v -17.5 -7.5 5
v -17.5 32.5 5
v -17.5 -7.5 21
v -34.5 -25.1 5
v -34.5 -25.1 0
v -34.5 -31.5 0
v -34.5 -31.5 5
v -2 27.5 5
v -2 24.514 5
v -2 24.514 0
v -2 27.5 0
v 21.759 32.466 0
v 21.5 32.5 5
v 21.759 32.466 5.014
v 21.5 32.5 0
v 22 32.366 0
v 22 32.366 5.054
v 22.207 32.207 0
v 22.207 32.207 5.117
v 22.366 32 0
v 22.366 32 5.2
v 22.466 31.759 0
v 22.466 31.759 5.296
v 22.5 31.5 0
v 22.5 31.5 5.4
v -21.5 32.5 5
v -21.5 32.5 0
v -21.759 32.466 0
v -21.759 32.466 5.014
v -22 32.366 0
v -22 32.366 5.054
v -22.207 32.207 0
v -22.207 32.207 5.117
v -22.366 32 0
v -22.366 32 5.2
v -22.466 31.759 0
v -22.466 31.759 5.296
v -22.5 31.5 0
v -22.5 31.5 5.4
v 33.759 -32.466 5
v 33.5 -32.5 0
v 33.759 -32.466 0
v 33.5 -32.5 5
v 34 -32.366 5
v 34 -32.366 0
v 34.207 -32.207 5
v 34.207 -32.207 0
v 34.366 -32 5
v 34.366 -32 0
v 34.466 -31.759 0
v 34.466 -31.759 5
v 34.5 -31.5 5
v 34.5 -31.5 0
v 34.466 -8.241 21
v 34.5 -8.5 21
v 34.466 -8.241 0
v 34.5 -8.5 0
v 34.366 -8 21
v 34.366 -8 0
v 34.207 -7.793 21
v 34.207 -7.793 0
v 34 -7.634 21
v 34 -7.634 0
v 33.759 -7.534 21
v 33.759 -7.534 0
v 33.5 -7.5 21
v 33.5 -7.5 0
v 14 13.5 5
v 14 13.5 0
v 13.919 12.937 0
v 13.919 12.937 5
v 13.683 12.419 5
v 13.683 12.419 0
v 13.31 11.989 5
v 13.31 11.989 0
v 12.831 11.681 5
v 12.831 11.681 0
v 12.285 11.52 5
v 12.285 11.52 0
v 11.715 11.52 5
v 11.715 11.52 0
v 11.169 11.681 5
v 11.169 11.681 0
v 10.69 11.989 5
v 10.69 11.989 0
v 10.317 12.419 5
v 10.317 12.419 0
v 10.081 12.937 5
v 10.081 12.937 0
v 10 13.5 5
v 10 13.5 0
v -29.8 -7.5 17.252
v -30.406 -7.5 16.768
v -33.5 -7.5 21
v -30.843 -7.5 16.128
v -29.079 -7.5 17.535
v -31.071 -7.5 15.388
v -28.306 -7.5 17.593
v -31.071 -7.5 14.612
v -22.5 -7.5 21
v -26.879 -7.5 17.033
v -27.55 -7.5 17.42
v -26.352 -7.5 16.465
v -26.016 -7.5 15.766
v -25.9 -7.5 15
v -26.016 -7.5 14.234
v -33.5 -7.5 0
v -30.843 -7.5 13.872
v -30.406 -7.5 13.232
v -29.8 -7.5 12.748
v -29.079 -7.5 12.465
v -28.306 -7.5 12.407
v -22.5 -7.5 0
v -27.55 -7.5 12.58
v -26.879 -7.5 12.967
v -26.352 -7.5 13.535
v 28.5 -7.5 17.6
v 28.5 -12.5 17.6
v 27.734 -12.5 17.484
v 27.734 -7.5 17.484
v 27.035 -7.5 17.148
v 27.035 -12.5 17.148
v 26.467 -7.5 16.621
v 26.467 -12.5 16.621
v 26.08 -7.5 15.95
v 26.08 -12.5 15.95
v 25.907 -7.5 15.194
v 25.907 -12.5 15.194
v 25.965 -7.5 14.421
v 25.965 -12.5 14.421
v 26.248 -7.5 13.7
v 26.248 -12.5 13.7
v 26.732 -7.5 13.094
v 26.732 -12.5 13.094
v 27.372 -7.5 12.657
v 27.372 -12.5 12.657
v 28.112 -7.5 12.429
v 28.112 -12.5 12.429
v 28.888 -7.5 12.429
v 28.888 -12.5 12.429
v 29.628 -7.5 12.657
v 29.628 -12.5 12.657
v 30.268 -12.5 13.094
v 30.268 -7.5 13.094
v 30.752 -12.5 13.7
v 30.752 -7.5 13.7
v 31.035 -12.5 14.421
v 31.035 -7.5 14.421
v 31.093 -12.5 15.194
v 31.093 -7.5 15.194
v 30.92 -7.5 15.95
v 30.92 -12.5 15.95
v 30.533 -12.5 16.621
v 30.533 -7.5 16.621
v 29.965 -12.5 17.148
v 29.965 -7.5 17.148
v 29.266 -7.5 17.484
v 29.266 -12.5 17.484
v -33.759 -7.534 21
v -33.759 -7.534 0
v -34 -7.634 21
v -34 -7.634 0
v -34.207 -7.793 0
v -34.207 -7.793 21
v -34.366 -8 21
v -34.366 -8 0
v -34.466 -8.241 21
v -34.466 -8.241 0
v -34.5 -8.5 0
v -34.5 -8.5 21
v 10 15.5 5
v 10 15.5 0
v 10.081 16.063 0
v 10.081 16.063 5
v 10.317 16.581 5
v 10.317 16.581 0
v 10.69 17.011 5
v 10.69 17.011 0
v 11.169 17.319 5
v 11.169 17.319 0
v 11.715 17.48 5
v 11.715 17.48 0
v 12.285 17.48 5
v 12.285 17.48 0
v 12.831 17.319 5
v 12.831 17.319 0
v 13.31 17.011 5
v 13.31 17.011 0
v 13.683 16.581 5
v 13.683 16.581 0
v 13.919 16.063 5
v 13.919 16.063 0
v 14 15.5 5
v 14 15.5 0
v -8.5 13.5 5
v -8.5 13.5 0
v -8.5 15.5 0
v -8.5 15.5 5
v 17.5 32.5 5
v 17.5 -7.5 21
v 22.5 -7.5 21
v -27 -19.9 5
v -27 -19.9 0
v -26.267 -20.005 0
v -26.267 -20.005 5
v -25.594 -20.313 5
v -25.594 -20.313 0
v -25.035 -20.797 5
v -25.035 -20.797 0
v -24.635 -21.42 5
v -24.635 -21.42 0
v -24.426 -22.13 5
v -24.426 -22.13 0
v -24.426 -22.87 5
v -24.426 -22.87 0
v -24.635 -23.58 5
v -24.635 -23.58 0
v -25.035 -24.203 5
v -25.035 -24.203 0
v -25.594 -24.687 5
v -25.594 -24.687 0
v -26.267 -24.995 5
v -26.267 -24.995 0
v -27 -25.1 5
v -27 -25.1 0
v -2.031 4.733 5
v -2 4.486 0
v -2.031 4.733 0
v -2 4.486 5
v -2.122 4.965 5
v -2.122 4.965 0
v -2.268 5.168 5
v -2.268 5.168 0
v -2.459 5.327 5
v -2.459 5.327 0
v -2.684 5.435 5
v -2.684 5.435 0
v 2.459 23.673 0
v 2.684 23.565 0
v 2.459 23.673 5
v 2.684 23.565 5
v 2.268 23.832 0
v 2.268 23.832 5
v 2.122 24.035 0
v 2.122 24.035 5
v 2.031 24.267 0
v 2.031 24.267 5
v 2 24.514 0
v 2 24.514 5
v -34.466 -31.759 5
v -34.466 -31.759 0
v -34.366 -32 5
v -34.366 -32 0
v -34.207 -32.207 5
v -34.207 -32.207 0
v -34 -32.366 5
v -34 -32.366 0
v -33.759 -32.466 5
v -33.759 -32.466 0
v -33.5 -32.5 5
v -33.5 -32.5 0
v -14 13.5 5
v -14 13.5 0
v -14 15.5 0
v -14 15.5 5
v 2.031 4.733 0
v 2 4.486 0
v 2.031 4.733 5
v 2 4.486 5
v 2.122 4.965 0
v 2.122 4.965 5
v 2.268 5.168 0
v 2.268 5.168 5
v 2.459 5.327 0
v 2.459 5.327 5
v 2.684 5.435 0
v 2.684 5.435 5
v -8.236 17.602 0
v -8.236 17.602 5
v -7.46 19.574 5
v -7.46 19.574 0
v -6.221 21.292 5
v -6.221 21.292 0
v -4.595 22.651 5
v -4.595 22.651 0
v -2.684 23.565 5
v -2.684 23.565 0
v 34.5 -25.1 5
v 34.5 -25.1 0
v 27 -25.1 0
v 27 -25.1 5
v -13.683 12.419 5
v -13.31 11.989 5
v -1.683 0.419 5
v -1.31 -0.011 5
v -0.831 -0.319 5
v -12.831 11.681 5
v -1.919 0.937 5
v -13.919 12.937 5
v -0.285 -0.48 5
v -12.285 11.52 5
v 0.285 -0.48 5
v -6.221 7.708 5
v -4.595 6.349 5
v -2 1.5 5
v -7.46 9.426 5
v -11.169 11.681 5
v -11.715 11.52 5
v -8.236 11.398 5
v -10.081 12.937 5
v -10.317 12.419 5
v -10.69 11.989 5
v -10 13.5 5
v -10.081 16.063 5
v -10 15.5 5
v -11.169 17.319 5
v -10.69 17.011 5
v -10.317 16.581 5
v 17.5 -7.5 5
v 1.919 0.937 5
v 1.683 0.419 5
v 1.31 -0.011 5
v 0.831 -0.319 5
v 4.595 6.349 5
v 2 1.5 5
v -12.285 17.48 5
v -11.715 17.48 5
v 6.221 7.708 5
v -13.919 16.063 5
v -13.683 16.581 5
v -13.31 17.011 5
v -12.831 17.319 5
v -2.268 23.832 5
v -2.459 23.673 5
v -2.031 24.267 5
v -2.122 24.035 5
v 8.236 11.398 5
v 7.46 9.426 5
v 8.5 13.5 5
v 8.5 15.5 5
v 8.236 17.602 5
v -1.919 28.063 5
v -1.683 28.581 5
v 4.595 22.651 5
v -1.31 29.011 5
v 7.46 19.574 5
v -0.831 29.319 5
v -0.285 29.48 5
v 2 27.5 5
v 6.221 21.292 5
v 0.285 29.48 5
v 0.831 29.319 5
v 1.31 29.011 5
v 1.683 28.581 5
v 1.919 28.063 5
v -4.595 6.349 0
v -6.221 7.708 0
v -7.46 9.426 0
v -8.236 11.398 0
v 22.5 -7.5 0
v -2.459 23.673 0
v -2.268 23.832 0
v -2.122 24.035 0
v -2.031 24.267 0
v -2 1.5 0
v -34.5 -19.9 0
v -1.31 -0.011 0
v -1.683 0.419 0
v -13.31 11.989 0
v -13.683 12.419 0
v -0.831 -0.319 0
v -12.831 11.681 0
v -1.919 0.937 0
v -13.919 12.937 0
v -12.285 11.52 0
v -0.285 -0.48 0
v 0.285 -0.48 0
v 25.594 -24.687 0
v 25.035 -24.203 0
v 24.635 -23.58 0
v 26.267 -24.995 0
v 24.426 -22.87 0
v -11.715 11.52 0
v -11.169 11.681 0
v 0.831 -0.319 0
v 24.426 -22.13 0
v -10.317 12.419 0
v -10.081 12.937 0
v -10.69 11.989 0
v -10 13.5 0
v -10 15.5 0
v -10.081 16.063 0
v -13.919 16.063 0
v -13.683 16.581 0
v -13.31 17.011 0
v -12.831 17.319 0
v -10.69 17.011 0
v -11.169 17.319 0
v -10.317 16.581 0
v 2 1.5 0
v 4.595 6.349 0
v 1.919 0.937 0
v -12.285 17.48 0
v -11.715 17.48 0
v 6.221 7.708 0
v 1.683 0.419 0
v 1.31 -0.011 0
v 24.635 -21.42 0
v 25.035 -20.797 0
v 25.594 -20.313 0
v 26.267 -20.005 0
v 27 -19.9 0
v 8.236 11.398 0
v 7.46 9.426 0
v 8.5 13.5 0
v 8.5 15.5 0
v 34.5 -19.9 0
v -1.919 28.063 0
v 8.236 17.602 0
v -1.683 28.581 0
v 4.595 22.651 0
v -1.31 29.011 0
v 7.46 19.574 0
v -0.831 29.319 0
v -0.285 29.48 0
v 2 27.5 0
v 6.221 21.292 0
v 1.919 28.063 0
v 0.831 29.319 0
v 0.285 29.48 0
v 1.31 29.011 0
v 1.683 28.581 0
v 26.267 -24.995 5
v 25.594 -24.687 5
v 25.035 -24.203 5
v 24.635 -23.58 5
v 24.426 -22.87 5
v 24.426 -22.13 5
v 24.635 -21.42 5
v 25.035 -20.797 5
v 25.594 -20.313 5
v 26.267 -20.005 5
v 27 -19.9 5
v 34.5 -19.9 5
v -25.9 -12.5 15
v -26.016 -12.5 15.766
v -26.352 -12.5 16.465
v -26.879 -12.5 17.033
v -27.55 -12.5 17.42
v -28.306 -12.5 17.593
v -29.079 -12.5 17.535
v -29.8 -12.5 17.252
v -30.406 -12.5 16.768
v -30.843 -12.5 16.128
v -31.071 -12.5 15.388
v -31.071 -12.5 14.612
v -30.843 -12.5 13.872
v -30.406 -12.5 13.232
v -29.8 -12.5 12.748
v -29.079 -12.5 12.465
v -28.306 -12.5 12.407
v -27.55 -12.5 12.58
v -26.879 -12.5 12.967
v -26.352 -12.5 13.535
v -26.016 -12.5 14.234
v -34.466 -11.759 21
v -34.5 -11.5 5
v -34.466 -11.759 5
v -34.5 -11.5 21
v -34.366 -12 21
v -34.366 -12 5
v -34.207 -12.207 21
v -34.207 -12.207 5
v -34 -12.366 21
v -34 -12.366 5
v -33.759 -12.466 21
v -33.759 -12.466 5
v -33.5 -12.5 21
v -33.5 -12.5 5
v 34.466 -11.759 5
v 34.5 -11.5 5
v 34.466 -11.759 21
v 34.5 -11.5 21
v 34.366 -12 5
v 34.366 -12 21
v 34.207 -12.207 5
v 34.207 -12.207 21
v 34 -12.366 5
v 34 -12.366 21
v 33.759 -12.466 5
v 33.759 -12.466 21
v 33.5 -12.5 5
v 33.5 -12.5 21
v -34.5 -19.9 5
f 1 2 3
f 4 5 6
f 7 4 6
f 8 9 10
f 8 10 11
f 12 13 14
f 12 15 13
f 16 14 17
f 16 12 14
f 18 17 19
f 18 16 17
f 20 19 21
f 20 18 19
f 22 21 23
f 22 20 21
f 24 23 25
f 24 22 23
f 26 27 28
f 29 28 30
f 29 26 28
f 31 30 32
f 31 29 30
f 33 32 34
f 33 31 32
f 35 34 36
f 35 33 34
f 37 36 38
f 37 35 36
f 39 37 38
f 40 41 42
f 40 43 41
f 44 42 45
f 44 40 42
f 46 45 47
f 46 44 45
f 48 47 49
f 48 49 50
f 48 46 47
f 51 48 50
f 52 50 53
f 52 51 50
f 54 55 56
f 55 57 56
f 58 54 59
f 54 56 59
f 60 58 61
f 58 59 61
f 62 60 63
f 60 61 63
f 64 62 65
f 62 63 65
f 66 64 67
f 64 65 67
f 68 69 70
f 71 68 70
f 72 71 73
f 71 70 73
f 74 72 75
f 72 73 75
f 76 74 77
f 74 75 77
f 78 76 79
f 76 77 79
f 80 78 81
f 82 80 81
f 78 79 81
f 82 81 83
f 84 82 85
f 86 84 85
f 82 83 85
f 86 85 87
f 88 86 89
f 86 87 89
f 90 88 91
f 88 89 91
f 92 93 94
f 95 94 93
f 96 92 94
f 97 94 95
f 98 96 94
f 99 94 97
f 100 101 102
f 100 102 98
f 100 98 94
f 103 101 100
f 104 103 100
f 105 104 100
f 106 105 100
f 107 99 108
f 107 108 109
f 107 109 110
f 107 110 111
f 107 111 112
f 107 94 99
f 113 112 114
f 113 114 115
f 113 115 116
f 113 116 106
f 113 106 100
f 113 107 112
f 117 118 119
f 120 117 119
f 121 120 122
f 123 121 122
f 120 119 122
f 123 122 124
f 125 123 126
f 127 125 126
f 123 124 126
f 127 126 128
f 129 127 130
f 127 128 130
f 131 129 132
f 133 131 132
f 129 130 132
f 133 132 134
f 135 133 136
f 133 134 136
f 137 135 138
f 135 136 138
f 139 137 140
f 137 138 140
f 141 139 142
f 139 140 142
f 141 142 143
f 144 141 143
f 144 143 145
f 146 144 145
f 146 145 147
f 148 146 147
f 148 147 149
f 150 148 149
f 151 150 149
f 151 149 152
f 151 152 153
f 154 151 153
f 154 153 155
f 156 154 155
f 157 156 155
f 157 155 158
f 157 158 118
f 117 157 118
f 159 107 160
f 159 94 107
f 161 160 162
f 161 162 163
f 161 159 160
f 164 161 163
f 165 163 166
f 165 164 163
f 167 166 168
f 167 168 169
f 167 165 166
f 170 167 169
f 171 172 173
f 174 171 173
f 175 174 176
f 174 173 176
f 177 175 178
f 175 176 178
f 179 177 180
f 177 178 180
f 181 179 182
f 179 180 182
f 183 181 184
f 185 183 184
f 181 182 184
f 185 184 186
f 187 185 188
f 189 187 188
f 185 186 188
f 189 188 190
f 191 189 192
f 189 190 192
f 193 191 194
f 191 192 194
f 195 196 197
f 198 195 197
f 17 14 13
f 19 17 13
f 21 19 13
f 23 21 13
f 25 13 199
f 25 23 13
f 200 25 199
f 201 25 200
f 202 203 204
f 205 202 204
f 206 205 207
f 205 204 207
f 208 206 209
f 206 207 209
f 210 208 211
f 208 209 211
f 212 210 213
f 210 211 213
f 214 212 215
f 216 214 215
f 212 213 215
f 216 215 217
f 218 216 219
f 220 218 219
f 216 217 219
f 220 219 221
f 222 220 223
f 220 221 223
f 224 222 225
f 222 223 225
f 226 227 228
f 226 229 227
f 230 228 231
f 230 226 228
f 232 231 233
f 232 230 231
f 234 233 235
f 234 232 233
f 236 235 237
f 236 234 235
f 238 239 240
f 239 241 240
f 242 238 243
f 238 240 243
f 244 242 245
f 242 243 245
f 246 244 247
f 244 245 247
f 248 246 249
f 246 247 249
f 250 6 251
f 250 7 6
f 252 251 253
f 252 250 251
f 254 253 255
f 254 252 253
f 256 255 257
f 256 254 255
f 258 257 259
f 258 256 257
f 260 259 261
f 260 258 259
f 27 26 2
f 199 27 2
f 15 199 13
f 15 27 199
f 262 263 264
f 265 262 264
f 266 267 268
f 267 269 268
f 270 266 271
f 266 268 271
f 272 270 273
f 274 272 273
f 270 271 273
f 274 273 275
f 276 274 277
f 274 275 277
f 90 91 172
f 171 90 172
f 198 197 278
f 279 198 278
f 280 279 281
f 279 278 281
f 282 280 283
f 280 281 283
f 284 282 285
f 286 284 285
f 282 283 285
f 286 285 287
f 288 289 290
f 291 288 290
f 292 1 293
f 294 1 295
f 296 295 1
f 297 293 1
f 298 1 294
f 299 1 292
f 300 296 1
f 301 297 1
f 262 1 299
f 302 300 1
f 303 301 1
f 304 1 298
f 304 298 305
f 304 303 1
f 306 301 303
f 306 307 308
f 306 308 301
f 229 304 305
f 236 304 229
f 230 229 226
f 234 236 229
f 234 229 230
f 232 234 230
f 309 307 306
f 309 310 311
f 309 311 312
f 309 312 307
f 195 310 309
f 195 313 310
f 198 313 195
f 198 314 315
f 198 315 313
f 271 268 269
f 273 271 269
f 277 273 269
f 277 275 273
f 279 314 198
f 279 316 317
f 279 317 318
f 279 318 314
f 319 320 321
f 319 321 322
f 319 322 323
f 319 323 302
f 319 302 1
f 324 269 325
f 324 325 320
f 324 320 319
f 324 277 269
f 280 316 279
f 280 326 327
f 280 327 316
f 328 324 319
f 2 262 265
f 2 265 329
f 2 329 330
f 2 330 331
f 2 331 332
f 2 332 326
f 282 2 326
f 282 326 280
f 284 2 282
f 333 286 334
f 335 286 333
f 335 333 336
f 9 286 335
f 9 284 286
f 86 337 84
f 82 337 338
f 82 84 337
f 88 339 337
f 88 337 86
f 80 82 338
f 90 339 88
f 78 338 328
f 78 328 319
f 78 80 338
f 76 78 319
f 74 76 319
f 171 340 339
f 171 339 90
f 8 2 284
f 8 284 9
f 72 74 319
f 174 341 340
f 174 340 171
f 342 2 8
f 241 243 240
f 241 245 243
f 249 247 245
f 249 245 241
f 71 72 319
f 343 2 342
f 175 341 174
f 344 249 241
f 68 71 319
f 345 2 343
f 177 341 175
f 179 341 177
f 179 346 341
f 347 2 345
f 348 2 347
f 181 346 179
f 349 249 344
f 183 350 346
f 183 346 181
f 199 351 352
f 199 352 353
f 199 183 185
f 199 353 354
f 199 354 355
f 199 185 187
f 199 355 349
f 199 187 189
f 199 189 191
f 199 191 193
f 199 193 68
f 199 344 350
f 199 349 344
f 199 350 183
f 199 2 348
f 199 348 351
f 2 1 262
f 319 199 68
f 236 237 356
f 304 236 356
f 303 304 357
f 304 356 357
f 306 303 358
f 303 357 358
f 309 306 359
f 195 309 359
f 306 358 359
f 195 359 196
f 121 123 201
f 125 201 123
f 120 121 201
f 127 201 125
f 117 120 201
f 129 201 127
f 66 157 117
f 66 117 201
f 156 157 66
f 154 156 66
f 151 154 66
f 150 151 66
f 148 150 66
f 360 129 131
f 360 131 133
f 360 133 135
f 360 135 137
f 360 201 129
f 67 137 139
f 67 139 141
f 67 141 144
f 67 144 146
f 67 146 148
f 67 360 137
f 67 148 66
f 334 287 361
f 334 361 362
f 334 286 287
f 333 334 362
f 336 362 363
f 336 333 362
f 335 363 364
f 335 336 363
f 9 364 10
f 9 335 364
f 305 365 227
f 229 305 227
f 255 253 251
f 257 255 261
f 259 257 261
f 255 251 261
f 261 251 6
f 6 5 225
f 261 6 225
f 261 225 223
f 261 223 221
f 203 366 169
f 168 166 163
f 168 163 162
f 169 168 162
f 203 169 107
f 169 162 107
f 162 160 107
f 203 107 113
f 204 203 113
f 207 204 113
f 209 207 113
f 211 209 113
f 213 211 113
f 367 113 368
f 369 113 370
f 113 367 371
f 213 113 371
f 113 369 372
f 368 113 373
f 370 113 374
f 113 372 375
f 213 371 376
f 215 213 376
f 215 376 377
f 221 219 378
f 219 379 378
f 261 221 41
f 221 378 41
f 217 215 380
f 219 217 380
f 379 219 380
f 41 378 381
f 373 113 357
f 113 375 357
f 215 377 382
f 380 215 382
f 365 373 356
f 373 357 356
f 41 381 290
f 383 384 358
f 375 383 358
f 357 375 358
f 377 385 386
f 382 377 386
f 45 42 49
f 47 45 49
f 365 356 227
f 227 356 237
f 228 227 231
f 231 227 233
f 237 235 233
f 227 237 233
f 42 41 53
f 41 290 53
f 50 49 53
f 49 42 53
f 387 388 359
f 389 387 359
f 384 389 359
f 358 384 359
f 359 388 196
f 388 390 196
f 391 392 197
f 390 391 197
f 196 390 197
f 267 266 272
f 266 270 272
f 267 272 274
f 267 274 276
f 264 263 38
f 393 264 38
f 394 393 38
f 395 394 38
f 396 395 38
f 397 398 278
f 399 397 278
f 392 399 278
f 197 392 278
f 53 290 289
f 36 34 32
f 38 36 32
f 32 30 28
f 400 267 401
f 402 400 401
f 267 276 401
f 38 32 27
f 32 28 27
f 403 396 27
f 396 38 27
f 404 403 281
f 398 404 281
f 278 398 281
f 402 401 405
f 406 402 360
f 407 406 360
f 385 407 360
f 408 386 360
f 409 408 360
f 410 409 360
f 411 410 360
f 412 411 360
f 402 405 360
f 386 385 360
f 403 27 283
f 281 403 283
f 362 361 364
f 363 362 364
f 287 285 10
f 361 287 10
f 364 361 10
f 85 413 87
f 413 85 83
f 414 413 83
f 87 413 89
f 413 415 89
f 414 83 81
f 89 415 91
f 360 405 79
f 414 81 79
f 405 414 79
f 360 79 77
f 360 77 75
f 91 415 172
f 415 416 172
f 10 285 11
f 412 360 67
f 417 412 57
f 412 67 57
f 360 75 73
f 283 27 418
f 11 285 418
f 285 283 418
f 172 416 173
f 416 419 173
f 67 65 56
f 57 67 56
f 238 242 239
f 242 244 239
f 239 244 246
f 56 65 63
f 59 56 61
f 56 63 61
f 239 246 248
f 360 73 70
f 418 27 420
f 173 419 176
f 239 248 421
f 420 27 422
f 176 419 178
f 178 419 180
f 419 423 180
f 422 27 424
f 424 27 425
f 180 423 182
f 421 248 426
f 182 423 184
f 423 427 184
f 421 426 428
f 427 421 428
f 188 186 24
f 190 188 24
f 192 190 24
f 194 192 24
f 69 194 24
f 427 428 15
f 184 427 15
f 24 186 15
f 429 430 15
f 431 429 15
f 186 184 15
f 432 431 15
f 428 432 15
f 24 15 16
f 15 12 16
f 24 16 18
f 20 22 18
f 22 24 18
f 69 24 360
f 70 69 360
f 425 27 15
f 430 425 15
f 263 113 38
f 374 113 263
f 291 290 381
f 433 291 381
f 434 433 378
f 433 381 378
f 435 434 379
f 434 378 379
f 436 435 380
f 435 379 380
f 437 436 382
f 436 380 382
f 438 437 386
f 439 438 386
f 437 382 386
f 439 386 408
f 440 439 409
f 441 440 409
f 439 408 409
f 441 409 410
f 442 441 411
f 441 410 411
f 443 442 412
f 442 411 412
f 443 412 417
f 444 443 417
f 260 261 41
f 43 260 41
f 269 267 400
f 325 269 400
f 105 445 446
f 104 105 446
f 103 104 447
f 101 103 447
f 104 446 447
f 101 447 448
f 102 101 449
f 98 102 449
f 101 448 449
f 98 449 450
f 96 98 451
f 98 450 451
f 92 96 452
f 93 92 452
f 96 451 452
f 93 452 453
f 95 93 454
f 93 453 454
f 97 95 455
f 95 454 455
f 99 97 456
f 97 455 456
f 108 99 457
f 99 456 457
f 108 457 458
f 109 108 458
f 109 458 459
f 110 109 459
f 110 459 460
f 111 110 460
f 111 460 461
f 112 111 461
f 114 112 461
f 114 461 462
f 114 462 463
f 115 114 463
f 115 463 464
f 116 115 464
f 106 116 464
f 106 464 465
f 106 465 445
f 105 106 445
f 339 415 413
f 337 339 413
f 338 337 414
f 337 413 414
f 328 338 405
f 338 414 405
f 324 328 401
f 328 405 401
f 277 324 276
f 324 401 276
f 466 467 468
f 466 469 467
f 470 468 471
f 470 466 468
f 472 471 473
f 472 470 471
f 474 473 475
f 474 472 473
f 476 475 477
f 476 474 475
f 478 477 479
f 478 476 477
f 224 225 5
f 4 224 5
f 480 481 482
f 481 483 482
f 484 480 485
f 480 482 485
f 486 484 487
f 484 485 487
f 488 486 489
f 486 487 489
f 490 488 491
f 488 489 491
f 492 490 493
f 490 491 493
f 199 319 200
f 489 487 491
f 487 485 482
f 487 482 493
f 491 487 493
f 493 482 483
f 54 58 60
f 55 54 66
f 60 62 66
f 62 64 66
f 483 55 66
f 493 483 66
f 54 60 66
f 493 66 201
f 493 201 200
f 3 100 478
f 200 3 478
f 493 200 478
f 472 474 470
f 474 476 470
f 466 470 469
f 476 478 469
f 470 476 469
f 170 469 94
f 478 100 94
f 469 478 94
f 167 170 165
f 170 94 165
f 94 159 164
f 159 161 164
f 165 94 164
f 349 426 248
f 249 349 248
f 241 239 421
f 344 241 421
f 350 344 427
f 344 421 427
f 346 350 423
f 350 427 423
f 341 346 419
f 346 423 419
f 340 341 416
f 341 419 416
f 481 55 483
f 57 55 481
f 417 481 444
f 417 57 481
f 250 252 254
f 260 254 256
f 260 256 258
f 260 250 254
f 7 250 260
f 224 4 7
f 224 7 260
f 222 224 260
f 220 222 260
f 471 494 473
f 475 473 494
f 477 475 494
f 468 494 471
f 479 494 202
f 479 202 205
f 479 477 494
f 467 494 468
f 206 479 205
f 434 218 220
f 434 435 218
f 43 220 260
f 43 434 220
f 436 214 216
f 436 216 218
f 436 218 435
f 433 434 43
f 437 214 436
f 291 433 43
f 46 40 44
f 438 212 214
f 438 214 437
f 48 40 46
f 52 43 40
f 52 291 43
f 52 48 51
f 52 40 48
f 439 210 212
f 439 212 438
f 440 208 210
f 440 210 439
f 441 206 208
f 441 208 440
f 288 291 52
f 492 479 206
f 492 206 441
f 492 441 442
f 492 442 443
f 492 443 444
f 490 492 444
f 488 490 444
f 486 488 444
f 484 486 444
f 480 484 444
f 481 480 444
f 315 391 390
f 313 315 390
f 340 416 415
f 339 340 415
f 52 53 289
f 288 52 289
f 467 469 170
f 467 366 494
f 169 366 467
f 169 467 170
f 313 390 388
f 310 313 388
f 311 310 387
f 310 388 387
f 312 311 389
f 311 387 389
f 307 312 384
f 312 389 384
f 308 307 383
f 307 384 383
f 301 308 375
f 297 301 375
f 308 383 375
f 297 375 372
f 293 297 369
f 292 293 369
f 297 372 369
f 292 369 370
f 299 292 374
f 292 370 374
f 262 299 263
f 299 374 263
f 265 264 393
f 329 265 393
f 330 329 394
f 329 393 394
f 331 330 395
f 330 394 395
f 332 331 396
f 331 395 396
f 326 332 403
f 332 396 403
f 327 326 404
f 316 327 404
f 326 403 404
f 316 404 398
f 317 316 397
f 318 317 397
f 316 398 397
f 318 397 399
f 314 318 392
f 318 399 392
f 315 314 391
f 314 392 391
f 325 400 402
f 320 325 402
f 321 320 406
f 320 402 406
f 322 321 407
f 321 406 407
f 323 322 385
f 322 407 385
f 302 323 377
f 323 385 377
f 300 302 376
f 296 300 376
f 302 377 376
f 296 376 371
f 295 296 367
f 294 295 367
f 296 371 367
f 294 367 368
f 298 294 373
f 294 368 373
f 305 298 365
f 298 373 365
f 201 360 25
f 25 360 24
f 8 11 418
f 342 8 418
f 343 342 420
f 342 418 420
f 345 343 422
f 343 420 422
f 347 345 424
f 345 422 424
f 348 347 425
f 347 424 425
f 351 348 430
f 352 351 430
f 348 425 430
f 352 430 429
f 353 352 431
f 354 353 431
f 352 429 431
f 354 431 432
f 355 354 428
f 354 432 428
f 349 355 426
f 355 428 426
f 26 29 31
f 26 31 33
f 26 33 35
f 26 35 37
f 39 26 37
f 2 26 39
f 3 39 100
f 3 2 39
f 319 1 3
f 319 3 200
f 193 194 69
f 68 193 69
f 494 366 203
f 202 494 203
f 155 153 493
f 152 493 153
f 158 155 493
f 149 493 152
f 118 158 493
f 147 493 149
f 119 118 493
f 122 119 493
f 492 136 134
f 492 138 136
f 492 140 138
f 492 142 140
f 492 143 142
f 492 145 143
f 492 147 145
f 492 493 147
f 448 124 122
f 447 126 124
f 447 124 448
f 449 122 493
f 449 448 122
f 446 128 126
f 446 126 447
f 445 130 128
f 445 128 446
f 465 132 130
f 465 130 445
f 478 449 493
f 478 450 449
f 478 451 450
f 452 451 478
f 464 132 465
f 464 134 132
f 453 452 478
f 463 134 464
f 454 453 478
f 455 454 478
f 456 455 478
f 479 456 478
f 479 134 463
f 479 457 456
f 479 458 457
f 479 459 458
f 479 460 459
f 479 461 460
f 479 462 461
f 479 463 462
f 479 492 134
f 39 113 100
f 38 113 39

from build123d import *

# Parameters (mm, degrees)
BOSS_EXTRUDE1_DEPTH = 5
BOSS_EXTRUDE2_DEPTH = 16
CUT_EXTRUDE1_DEPTH  = 69.893033029
SKETCH4_R           = 2.6
CUT_EXTRUDE2_DEPTH  = 16
FILLET1_R           = 1
FILLET2_R           = 1


with BuildPart() as part:
    # Sketch1 → Boss-Extrude1 (new body)
    with BuildSketch(Plane.XY):
        with BuildLine():
            Line((-34.5, -25.1), (-34.5, -32.5))
            Line((-34.5, -32.5), (34.5, -32.5))
            Line((34.5, -32.5), (34.5, -25.1))
            Line((34.5, -25.1), (27, -25.1))
            ThreePointArc((27, -25.1), (24.4, -22.5), (27, -19.9))
            Line((27, -19.9), (34.5, -19.9))
            Line((34.5, -19.9), (34.5, -7.5))
            Line((34.5, -7.5), (22.5, -7.5))
            Line((22.5, -7.5), (22.5, 32.5))
            Line((22.5, 32.5), (-22.5, 32.5))
            Line((-22.5, 32.5), (-22.5, -7.5))
            Line((-22.5, -7.5), (-34.5, -7.5))
            Line((-34.5, -7.5), (-34.5, -19.9))
            Line((-34.5, -19.9), (-27, -19.9))
            ThreePointArc((-27, -19.9), (-24.4, -22.5), (-27, -25.1))
            Line((-27, -25.1), (-34.5, -25.1))
        make_face()
        with BuildLine():
            ThreePointArc((-14, 15.5), (-12, 17.5), (-10, 15.5))
            Line((-10, 15.5), (-10, 13.5))
            ThreePointArc((-10, 13.5), (-12, 11.5), (-14, 13.5))
            Line((-14, 13.5), (-14, 15.5))
        make_face(mode=Mode.SUBTRACT)
        with BuildLine():
            ThreePointArc((-2, 27.5), (0, 29.5), (2, 27.5))
            Line((2, 27.5), (2, 23.761355821))
            ThreePointArc((2, 23.761355821), (6.680194608, 20.75594901), (8.5, 15.5))
            Line((8.5, 15.5), (8.5, 13.5))
            ThreePointArc((8.5, 13.5), (6.680194608, 8.24405099), (2, 5.238644179))
            Line((2, 5.238644179), (2, 1.5))
            ThreePointArc((2, 1.5), (0, -0.5), (-2, 1.5))
            Line((-2, 1.5), (-2, 5.238644179))
            ThreePointArc((-2, 5.238644179), (-6.680194608, 8.24405099), (-8.5, 13.5))
            Line((-8.5, 13.5), (-8.5, 15.5))
            ThreePointArc((-8.5, 15.5), (-6.680194608, 20.75594901), (-2, 23.761355821))
            Line((-2, 23.761355821), (-2, 27.5))
        make_face(mode=Mode.SUBTRACT)
        with BuildLine():
            Line((10, 13.5), (10, 15.5))
            ThreePointArc((10, 15.5), (12, 17.5), (14, 15.5))
            Line((14, 15.5), (14, 13.5))
            ThreePointArc((14, 13.5), (12, 11.5), (10, 13.5))
        make_face(mode=Mode.SUBTRACT)
    extrude(amount=BOSS_EXTRUDE1_DEPTH)

    # Sketch2 → Boss-Extrude2 (add)
    with BuildSketch(Plane.XY.offset(5)):
        Polygon((-22.5, 32.5), (-17.5, 32.5), (-17.5, -7.5), (17.5, -7.5), (17.5, 32.5), (22.5, 32.5), (22.5, -7.5), (34.5, -7.5), (34.5, -12.5), (-34.5, -12.5), (-34.5, -7.5), (-22.5, -7.5), align=None)
    extrude(amount=BOSS_EXTRUDE2_DEPTH)

    # Sketch3 → Cut-Extrude1 (cut, through all)
    with BuildSketch(Plane(origin=(22.5, 0, 0), x_dir=(0, 0, -1), z_dir=(1, 0, 0))):
        Polygon((-21, -7.5), (-21, 32.5), (-5, 32.5), align=None)
    extrude(amount=-CUT_EXTRUDE1_DEPTH, mode=Mode.SUBTRACT)

    # Sketch4 → Cut-Extrude2 (cut)
    with BuildSketch(Plane.XZ.offset(12.5)):
        with Locations((-28.5, 15)):
            Circle(SKETCH4_R)
        with Locations(Location((28.5, 15, 0), (0, 0, 90))):
            Circle(SKETCH4_R)
    extrude(amount=-CUT_EXTRUDE2_DEPTH, mode=Mode.SUBTRACT)

    # Fillet1
    fillet1_edges = [part.edges().sort_by_distance(p)[0] for p in [
        (-34.5, -12.5, 13),
        (34.5, -12.5, 13),
        (-22.5, 32.5, 2.5),
        (22.5, 32.5, 2.5),
        (34.5, -32.5, 2.5),
        (-34.5, -32.5, 2.5),
        (-34.5, -7.5, 10.5),
        (34.5, -7.5, 10.5),
    ]]
    fillet(fillet1_edges, radius=FILLET1_R)

    # Fillet2
    fillet2_edges = [part.edges().sort_by_distance(p)[0] for p in [
        (-2, 5.238644179, 2.5),
        (2, 5.238644179, 2.5),
        (2, 23.761355821, 2.5),
        (-2, 23.761355821, 2.5),
    ]]
    fillet(fillet2_edges, radius=FILLET2_R)


solid = part.part
